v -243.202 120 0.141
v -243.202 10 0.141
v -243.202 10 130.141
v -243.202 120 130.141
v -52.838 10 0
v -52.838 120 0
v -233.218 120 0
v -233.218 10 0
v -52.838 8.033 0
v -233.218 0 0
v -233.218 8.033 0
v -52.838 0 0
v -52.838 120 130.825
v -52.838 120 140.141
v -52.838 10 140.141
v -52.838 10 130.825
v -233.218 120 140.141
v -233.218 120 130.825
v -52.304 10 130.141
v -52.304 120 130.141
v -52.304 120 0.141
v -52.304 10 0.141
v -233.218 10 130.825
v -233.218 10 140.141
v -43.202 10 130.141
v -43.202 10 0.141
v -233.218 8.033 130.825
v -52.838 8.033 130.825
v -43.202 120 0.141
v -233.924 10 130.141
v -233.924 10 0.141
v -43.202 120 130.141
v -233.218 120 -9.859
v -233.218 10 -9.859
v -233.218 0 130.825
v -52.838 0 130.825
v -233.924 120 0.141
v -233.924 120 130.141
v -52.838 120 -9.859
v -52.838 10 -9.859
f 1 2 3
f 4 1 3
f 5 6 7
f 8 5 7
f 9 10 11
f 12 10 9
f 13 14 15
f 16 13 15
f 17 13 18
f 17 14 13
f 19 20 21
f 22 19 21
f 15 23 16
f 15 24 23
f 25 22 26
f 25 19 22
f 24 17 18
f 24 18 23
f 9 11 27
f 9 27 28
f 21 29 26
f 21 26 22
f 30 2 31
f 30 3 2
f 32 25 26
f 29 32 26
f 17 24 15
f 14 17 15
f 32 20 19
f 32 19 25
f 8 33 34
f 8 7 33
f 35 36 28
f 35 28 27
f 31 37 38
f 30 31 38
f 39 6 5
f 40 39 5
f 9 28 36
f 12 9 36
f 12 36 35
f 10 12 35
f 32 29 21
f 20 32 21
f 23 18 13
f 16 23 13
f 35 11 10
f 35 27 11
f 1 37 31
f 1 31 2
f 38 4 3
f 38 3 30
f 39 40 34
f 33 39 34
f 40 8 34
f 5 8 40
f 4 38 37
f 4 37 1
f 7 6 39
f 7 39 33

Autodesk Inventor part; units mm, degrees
ref_plane "YZ Plane" through (0, 0, 0) normal (1, 0, 0) x (0, 1, 0)
ref_plane "XZ Plane" through (0, 0, 0) normal (0, 1, 0) x (-1, 0, 0)
ref_plane "XY Plane" through (0, 0, 0) normal (0, 0, 1) x (1, 0, 0)
sketch "Sketch1" plane through (0, 0, 0) normal (0, 1, 0) x (-1, 0, 0)
  line L0 (243.2018, 140.1406) -> (43.2018, 140.1406)
  line L1 (43.2018, 140.1406) -> (43.2018, -9.8594)
  line L2 (43.2018, -9.8594) -> (243.2018, -9.8594)
  line L3 (243.2018, -9.8594) -> (243.2018, 140.1406)
  point P0 (0, 0)
  dimension "d0" = 200
  dimension "d1" = 150
extrude "Extrusion1" add sketch "Sketch1" along normal blind 120
sketch "Sketch2" plane through (0, 120, 0) normal (0, 1, 0) x (1, 0, 0)
  line L0 (-233.9237, -130.8252) -> (-52.3036, -130.8252)
  line L1 (-52.3036, -130.8252) -> (-52.3036, 0)
  line L2 (-52.3036, 0) -> (-233.9237, 0)
  line L3 (-233.9237, 0) -> (-233.9237, -130.8252)
  point P0 (0, 0)
extrude "Extrusion2" cut sketch "Sketch2" against normal blind 110
sketch "Sketch3" plane through (-243.2018, 0, 140.1406) normal (0, 0, 1) x (1, 0, 0)
  line L0 (0, 0) -> (0, 120) projected
  line L1 (0, 0) -> (200, 0) projected
  line L2 (0, 120) -> (9.9841, 120)
  line L3 (9.9841, 120) -> (9.9841, 0)
  line L4 (9.9841, 0) -> (0, 0)
  line L5 (0, 0) -> (0, 120)
  point P0 (243.2018, 0)
extrude "Extrusion3" cut sketch "Sketch3" against normal blind 10
sketch "Sketch4" plane through (-43.2018, 0, 140.1406) normal (0, 0, 1) x (1, 0, 0)
  line L0 (0, 120) -> (-200, 120) projected
  line L1 (0, 0) -> (-200, 0) projected
  line L2 (0, 120) -> (-9.6366, 120)
  line L3 (-9.6366, 120) -> (-9.6366, 0)
  line L4 (-9.6366, 0) -> (0, 0)
  line L5 (0, 0) -> (0, 120)
  point P0 (43.2018, 0)
extrude "Extrusion4" cut sketch "Sketch4" against normal blind 10
sketch "Sketch5" plane through (-43.2018, 0, -9.8594) normal (0, 0, -1) x (-1, 0, 0)
  line L0 (0, 120) -> (200, 120) projected
  line L1 (190.0159, 0) -> (9.6366, 0) projected
  line L2 (0, 120) -> (9.6366, 120)
  line L3 (9.6366, 120) -> (9.6366, 0)
  line L4 (9.6366, 0) -> (0, 0)
  line L5 (0, 0) -> (0, 120)
  point P0 (-43.2018, 0)
extrude "Extrusion5" cut sketch "Sketch5" against normal blind 10
sketch "Sketch6" plane through (-243.2018, 0, -9.8594) normal (0, 0, -1) x (-1, 0, 0)
  line L0 (0, 0) -> (0, 120) projected
  line L1 (-190.3634, 0) -> (0, 0) projected
  line L2 (0, 120) -> (-9.9841, 120)
  line L3 (-9.9841, 120) -> (-9.9841, 0)
  line L4 (-9.9841, 0) -> (0, 0)
  line L5 (0, 0) -> (0, 120)
  point P0 (-243.2018, 0)
extrude "Extrusion6" cut sketch "Sketch6" against normal blind 10
sketch "Sketch7" plane through (0, 0, 0) normal (0, -1, 0) x (1, 0, 0)
  point P0 (0, 0)
sketch "Sketch8" plane through (0, 0, 0) normal (0, -1, 0) x (1, 0, 0)
  line L0 (-233.2177, 130.1406) -> (-243.2018, 130.1406) projected
  line L1 (-243.2018, 0.1406) -> (-243.2018, 130.1406) projected
  line L2 (-233.2177, 130.1406) -> (-243.2018, 130.1406)
  line L3 (-243.2018, 130.1406) -> (-243.2018, 0.1406)
  line L4 (-243.2018, 0.1406) -> (-233.2177, 0.1406)
  line L5 (-233.2177, 0.1406) -> (-233.2177, 130.1406)
  point P0 (0, 0)
extrude "Extrusion7" cut sketch "Sketch8" against normal blind 10
sketch "Sketch9" plane through (0, 0, 0) normal (0, -1, 0) x (1, 0, 0)
  line L0 (-43.2018, 130.1406) -> (-43.2018, 0.1406) projected
  line L1 (-233.2177, 0) -> (-52.8384, 0) projected
  line L2 (-43.2018, 130.1406) -> (-52.8384, 130.1406)
  line L3 (-52.8384, 130.1406) -> (-52.8384, 0)
  line L4 (-52.8384, 0) -> (-43.2018, 0)
  line L5 (-43.2018, 0) -> (-43.2018, 130.1406)
  point P0 (0, 0)
extrude "Extrusion8" cut sketch "Sketch9" against normal blind 10
sketch "Sketch10" plane through (0, 0, 0) normal (0, -1, 0) x (1, 0, 0)
  line L0 (-233.2177, 0) -> (-52.8384, 0) projected
  line L1 (-233.2177, 140.1406) -> (-233.2177, -9.8594) projected
  line L2 (-52.8384, 0) -> (-233.2177, 0)
  line L3 (-233.2177, 0) -> (-233.2177, -9.8594)
  line L4 (-233.2177, -9.8594) -> (-52.8384, -9.8594)
  line L5 (-52.8384, -9.8594) -> (-52.8384, 0)
  point P0 (0, 0)
extrude "Extrusion9" cut sketch "Sketch10" against normal blind 10
sketch "Sketch11" plane through (0, 0, 0) normal (0, -1, 0) x (1, 0, 0)
  line L0 (-52.8384, 140.1406) -> (-52.8384, 130.8252) projected
  line L1 (-52.8384, 130.8252) -> (-233.2177, 130.8252) projected
  line L2 (-52.8384, 140.1406) -> (-233.2177, 140.1406)
  line L3 (-233.2177, 140.1406) -> (-233.2177, 130.8252)
  line L4 (-233.2177, 130.8252) -> (-52.8384, 130.8252)
  line L5 (-52.8384, 130.8252) -> (-52.8384, 140.1406)
  point P0 (0, 0)
extrude "Extrusion10" cut sketch "Sketch11" against normal blind 10
sketch "Sketch12" plane through (-52.8384, 0, 0) normal (0, 0, -1) x (-1, 0, 0)
  line L0 (0, 10) -> (0, 0) projected
  line L1 (180.3793, 10) -> (180.3793, 0) projected
  line L2 (0, 10) -> (180.3793, 10)
  line L3 (180.3793, 10) -> (180.3793, 8.0332)
  line L4 (180.3793, 8.0332) -> (0, 8.0332)
  line L5 (0, 8.0332) -> (0, 10)
  point P0 (-52.8384, 0)
extrude "Extrusion11" cut sketch "Sketch12" against normal through all
equation "\"BendRadius\" = Thickness"
equation "\"BendReliefWidth\" = Thickness"
equation "\"BendReliefDepth\" = 0.5 * Thickness"
equation "\"CornerReliefSize\" = 4 * Thickness"
equation "\"MinimumRemnant\" = 2 * Thickness"
equation "\"TransitionRadius\" = BendRadius"
equation "\"JacobiRadiusSize\" = BendRadius"
equation "\"GapSize\" = Thickness"
equation "\"Thickness\" = 0.5"
properties part number "frame"
